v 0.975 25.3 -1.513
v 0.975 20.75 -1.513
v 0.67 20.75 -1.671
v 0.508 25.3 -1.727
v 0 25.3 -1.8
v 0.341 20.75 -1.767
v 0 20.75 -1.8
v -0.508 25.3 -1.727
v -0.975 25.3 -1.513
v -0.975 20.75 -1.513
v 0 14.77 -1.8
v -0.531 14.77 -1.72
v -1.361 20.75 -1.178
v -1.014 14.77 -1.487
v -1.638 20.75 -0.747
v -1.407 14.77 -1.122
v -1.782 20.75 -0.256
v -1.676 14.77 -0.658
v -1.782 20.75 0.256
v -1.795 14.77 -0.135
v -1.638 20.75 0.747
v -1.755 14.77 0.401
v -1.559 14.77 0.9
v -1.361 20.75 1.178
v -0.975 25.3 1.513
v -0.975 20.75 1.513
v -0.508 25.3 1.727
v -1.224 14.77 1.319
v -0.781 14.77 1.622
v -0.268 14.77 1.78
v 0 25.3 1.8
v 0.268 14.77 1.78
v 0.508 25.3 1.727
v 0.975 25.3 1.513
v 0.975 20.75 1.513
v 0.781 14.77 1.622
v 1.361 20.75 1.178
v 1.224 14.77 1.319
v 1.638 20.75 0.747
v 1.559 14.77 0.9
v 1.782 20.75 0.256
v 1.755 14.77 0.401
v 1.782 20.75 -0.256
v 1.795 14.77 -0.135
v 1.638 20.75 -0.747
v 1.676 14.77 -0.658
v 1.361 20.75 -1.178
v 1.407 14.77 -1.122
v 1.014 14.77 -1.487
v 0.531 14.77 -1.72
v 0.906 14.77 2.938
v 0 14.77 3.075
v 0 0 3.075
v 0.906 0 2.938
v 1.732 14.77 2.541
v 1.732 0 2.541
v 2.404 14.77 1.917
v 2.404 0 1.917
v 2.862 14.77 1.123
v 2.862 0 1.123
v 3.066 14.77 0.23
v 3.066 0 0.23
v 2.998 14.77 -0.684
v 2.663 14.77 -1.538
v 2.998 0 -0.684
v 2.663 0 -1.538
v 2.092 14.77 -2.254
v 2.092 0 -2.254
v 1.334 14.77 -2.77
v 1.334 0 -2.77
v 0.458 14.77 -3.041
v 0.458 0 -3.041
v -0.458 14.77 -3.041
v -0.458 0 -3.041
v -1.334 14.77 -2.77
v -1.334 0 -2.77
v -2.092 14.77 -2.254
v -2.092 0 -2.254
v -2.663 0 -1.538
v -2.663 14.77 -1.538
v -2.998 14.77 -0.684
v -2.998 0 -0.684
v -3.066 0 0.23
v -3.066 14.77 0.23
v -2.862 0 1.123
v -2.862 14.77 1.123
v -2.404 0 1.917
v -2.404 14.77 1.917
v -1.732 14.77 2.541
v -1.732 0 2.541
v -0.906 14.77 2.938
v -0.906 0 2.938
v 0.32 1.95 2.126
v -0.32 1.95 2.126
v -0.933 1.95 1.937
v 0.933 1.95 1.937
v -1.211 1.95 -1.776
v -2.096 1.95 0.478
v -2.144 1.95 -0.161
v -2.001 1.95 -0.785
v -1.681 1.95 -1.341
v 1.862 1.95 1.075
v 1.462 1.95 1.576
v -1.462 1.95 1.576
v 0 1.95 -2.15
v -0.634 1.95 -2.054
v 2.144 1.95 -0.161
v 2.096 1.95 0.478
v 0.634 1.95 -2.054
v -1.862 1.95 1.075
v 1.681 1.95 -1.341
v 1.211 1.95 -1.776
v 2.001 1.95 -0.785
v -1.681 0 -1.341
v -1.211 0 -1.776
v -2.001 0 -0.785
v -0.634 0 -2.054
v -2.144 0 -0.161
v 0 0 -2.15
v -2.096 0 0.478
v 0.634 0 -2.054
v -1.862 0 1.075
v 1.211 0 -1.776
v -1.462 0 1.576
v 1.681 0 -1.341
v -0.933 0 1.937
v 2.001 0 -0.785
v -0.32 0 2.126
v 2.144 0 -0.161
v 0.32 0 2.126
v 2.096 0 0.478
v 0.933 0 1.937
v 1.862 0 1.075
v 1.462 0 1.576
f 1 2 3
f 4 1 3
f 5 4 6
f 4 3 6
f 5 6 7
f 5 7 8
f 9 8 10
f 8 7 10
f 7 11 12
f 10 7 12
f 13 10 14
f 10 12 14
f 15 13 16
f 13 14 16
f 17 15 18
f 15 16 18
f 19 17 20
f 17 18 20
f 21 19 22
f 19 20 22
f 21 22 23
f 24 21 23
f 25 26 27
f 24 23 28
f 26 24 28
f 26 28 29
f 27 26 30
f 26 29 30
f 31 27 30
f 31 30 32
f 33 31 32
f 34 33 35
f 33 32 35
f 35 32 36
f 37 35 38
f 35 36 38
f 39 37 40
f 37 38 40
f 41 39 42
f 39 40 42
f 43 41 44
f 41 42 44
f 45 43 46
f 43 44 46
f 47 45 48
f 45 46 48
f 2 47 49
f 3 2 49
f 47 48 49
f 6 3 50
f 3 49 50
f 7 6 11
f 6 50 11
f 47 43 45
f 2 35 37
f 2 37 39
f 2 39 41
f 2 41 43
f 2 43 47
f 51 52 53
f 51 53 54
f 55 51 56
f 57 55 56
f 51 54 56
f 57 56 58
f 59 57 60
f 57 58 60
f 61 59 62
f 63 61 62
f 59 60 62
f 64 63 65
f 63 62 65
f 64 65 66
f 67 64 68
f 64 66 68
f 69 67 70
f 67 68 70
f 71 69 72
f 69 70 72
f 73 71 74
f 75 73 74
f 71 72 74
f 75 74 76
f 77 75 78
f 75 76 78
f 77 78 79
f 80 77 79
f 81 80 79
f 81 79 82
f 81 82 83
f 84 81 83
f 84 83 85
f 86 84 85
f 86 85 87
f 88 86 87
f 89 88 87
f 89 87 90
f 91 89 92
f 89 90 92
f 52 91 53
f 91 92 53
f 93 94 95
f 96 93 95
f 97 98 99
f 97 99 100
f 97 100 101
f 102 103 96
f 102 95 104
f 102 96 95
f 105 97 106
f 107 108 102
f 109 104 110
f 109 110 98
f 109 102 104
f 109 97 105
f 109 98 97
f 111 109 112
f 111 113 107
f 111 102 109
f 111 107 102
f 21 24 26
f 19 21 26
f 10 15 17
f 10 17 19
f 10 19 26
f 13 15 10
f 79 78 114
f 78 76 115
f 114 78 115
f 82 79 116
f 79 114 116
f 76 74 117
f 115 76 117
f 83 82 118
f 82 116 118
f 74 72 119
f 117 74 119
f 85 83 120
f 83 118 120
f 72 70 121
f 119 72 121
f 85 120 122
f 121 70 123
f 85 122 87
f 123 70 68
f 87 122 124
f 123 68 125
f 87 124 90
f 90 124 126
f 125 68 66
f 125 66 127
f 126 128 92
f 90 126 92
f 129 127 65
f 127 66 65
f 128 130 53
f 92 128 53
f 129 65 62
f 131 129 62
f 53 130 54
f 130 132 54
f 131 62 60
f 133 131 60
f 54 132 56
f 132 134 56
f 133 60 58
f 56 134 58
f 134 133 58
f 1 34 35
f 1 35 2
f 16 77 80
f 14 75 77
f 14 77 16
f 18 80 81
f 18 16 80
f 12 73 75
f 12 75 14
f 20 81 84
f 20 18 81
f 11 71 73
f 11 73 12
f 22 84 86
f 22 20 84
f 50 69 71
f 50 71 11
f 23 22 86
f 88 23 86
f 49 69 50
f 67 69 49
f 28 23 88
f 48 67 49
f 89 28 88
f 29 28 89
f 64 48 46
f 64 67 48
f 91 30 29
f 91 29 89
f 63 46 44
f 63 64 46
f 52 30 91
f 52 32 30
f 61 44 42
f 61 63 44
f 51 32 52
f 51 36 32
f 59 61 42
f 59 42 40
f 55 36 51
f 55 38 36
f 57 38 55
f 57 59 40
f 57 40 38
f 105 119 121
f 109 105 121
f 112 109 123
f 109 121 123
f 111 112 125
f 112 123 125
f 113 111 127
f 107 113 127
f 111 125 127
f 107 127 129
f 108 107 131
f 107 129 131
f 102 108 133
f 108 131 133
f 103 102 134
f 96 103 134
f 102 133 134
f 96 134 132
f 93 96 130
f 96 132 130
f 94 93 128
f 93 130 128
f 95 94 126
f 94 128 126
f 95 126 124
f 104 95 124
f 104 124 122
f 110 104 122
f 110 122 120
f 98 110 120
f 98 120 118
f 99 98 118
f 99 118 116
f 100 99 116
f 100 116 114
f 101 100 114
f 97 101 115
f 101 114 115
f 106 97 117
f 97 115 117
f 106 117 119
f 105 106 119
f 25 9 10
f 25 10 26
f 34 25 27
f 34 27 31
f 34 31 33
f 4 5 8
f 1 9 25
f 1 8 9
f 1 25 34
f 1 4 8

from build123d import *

# Parameters (mm, degrees)
SKETCH1_R           = 3.075
BOSS_EXTRUDE1_DEPTH = 14.77
SKETCH2_R           = 1.8
BOSS_EXTRUDE2_DEPTH = 5.98
BOSS_EXTRUDE3_DEPTH = 4.55
SKETCH4_R           = 2.15
CUT_EXTRUDE1_DEPTH  = 1.95


with BuildPart() as part:
    # Sketch1 → Boss-Extrude1 (new body)
    with BuildSketch(Plane(origin=(0, 0, 0), x_dir=(1, 0, 0), z_dir=(0, 1, 0))):
        with Locations(Location((0, 0, 0), (0, 0, 270))):
            Circle(SKETCH1_R)
    extrude(amount=BOSS_EXTRUDE1_DEPTH)

    # Sketch2 → Boss-Extrude2 (add)
    with BuildSketch(Plane(origin=(0, 14.77, 0), x_dir=(1, 0, 0), z_dir=(0, 1, 0))):
        with Locations(Location((0, 0, 0), (0, 0, 90))):
            Circle(SKETCH2_R)
    extrude(amount=BOSS_EXTRUDE2_DEPTH)

    # Sketch3 → Boss-Extrude3 (add)
    with BuildSketch(Plane(origin=(0, 20.75, 0), x_dir=(1, 0, 0), z_dir=(0, 1, 0))):
        with BuildLine():
            Line((-0.975, 1.513068075), (-0.975, -1.513068075))
            ThreePointArc((-0.975, -1.513068075), (0, -1.8), (0.975, -1.513068075))
            Line((0.975, -1.513068075), (0.975, 1.513068075))
            ThreePointArc((0.975, 1.513068075), (0, 1.8), (-0.975, 1.513068075))
        make_face()
    extrude(amount=BOSS_EXTRUDE3_DEPTH)

    # Sketch4 → Cut-Extrude1 (cut)
    with BuildSketch(Plane.XZ):
        with Locations(Location((0, 0, 0), (0, 0, 270))):
            Circle(SKETCH4_R)
    extrude(amount=-CUT_EXTRUDE1_DEPTH, mode=Mode.SUBTRACT)


solid = part.part
